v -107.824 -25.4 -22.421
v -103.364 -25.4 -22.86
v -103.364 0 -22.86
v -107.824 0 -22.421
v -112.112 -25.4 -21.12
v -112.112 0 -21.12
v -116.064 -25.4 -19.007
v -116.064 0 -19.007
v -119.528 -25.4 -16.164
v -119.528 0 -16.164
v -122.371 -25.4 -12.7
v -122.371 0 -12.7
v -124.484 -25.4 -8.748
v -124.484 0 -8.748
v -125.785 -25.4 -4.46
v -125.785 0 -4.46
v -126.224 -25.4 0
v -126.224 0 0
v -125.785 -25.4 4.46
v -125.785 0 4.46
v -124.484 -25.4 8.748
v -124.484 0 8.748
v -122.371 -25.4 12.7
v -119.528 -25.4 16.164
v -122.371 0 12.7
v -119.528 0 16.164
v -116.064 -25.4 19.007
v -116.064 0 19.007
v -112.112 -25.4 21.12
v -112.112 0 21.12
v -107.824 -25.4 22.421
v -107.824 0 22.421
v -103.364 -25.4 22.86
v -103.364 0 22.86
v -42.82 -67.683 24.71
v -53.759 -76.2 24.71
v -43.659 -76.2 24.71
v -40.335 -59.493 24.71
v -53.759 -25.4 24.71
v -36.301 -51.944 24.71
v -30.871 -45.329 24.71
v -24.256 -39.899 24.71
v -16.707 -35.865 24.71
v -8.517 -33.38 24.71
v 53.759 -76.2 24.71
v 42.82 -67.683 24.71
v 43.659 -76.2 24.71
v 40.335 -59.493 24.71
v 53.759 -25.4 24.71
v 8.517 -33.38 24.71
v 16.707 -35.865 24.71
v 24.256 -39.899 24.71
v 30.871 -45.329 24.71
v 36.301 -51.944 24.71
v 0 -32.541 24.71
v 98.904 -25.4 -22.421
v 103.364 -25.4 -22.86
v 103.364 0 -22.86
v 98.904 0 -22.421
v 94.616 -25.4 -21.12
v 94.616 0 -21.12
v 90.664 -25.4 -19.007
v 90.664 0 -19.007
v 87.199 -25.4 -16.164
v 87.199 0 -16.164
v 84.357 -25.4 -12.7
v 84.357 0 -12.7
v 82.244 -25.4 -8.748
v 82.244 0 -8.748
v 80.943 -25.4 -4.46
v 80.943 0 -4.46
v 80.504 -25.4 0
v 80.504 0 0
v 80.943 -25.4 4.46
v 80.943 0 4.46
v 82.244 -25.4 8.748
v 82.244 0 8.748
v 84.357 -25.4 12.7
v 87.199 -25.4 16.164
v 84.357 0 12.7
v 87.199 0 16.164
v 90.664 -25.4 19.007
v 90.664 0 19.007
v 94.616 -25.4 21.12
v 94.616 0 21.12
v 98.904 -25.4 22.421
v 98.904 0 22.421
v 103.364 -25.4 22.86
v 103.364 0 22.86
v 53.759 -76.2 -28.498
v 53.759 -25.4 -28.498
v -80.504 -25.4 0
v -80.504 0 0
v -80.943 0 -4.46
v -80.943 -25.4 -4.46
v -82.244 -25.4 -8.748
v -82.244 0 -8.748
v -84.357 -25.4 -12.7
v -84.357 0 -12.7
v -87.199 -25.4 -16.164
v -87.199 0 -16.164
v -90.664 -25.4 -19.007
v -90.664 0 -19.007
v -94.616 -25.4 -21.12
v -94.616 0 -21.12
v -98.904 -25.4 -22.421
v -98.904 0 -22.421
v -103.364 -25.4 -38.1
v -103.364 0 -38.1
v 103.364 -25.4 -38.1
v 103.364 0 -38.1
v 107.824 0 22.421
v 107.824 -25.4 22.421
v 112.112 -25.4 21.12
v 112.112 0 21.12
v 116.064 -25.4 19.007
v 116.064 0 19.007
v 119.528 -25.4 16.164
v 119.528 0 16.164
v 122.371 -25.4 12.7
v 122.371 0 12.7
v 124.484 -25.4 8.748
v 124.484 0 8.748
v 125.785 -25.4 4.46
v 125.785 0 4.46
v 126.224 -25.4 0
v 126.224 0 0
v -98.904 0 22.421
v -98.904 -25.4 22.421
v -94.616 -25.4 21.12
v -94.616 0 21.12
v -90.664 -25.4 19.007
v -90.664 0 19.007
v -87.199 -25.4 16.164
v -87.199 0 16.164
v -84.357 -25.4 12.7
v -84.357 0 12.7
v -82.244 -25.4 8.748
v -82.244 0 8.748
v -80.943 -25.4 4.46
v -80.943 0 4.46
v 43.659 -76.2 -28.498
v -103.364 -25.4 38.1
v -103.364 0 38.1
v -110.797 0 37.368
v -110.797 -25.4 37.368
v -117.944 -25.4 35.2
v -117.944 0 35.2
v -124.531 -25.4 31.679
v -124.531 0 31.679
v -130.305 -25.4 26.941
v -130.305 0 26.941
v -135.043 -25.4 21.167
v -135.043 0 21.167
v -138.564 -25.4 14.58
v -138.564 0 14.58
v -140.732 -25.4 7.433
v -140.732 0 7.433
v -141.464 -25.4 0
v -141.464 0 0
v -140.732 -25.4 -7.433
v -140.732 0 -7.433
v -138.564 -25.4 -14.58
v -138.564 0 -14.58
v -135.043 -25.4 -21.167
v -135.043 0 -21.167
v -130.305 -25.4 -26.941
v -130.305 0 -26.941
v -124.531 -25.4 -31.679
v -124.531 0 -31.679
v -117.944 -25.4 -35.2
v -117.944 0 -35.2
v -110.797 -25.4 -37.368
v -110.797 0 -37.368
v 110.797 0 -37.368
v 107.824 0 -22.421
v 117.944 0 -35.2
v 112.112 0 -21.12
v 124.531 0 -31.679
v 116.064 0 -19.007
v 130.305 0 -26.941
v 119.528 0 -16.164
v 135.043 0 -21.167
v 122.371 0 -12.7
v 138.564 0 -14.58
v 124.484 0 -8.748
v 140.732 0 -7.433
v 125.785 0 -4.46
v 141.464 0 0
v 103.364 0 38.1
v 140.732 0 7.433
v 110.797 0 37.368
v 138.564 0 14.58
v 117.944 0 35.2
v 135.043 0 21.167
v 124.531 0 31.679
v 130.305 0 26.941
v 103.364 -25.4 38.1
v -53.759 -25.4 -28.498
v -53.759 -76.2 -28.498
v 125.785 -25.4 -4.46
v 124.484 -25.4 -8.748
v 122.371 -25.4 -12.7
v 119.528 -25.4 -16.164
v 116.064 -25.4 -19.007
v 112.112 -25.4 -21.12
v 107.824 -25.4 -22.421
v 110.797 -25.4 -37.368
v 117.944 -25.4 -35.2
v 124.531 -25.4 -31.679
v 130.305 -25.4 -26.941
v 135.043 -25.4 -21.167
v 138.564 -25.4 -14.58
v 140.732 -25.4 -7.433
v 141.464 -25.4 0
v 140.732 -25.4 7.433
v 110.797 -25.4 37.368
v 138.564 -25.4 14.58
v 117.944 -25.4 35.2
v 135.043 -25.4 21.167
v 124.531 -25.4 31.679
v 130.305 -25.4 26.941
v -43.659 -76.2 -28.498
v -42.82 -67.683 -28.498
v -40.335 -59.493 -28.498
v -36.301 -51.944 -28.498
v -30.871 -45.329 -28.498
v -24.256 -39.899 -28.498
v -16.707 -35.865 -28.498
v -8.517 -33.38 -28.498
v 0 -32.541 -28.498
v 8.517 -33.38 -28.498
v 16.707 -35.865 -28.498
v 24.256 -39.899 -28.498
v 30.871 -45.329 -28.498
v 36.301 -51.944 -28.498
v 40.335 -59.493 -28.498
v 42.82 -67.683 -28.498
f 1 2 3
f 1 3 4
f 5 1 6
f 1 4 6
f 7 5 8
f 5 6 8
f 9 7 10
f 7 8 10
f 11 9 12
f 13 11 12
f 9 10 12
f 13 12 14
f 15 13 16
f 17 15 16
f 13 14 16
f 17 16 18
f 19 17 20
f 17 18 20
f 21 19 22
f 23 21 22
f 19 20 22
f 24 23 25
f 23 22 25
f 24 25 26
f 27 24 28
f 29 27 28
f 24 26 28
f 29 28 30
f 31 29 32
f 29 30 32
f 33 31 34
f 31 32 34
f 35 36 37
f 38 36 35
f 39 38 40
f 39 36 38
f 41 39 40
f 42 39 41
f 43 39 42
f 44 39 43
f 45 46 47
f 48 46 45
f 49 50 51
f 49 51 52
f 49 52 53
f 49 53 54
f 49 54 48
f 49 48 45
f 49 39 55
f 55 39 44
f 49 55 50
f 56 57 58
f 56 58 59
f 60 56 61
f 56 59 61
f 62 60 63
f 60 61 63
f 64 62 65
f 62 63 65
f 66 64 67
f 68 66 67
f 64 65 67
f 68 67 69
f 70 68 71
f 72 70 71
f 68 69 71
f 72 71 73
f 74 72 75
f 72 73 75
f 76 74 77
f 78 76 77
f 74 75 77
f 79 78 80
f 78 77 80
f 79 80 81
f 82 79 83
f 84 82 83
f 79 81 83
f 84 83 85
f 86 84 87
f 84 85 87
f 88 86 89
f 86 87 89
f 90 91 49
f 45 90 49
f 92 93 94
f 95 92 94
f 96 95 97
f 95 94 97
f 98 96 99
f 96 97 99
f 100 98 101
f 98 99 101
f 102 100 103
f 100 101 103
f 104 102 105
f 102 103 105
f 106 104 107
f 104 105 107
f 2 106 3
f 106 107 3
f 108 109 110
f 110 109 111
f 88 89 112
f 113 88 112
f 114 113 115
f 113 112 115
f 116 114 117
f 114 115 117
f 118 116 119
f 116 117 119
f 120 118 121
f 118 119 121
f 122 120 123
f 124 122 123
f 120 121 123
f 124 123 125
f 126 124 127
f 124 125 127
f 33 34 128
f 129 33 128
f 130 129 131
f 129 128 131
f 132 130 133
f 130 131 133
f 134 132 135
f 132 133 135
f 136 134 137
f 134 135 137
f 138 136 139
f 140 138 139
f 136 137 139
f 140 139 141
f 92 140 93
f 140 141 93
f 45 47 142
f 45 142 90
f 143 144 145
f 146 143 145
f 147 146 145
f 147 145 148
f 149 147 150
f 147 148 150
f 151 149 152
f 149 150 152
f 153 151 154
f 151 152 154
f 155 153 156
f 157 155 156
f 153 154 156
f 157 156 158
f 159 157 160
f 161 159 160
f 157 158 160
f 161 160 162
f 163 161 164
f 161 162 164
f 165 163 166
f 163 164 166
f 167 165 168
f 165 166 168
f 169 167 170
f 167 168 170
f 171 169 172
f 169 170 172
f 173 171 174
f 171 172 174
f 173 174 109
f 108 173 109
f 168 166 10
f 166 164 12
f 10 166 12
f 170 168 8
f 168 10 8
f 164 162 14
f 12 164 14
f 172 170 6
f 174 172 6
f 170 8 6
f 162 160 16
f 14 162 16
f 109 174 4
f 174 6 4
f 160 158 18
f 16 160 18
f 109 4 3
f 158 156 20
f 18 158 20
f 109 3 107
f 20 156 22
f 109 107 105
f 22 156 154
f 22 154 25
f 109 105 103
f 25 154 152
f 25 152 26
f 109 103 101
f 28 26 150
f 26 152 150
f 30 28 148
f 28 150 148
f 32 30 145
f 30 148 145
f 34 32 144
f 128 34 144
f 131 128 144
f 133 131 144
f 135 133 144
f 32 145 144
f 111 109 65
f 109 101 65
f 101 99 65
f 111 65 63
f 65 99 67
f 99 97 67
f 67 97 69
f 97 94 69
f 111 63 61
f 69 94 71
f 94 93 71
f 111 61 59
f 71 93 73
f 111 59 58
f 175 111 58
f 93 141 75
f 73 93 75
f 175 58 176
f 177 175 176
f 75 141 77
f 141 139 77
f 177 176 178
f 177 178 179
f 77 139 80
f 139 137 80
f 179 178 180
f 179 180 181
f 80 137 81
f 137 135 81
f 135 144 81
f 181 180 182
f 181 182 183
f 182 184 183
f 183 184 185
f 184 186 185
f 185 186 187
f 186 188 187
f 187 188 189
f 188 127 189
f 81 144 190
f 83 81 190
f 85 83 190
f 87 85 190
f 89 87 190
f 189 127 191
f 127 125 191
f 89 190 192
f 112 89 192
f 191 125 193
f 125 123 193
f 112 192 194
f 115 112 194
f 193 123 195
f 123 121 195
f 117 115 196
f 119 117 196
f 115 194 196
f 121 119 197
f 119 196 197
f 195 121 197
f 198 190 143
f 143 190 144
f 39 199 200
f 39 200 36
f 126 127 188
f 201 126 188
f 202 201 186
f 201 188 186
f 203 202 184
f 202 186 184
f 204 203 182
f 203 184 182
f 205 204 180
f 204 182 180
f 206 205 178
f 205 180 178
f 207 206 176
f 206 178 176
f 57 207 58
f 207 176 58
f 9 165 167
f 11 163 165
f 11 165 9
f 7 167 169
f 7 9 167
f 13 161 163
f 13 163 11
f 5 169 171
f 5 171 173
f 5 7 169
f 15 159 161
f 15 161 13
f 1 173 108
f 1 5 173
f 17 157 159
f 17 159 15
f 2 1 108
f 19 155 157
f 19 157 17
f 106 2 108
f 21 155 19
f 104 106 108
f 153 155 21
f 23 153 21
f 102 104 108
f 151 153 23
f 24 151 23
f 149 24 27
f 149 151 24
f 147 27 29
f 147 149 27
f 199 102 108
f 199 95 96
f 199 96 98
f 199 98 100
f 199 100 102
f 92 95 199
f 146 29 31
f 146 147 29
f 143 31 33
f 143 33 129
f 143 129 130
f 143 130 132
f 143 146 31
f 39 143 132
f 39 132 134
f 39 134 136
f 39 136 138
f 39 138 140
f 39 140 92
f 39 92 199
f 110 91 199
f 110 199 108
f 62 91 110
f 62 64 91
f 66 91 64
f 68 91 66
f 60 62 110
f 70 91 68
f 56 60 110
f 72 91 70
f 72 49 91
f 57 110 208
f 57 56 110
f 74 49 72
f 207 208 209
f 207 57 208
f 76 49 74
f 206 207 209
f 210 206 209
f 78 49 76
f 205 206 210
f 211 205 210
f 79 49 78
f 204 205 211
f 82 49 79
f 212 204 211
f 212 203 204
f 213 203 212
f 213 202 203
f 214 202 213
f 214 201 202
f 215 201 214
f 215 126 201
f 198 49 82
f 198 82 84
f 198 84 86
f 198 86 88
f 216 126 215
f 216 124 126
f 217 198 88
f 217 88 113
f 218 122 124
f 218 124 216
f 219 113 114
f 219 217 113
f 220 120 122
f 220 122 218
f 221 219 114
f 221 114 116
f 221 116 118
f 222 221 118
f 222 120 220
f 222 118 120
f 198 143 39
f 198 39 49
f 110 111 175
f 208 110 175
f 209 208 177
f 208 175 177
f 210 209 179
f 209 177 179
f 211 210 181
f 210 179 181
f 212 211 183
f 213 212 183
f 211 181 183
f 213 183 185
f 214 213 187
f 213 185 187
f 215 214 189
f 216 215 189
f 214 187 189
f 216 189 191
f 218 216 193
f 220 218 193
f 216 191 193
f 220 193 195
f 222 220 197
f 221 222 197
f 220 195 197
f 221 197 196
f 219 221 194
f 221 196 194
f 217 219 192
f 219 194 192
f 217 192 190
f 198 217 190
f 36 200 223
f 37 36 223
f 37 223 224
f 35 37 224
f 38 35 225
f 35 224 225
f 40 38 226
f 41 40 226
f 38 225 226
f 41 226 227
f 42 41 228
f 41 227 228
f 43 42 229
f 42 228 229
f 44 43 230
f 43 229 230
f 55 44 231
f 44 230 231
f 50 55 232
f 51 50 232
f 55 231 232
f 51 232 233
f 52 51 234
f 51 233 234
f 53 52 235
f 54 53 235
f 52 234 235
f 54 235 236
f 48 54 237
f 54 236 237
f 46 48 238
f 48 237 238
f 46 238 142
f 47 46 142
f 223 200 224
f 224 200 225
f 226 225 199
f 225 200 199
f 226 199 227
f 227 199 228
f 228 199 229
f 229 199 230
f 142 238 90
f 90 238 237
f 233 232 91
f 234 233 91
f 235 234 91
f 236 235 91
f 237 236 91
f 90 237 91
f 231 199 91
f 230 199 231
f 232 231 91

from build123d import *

# Parameters (mm, degrees)
F1_DEPTH = 25.4
F2_W     = 107.5181365013
F2_H     = 53.2084149309
F3_DEPTH = 50.8
F4_R     = 43.6587817112
F5_DEPTH = 203.2


with BuildPart() as f1:
    # F0 (on Front) → F1 (new body)
    with BuildSketch(Plane.XZ):
        with BuildLine():
            Line((-103.3638969086, 22.86), (-103.3638969086, 38.1))
            ThreePointArc((-103.3638969086, 38.1), (-141.4638969086, 0), (-103.3638969086, -38.1))
            Line((-103.3638969086, -38.1), (-103.3638969086, -22.86))
            ThreePointArc((-103.3638969086, -22.86), (-126.2238969086, 0), (-103.3638969086, 22.86))
        make_face()
        with BuildLine():
            ThreePointArc((141.4638969086, 0), (130.3046652718, 26.9407683632), (103.3638969086, 38.1))
            Line((103.3638969086, 38.1), (103.3638969086, 22.86))
            ThreePointArc((103.3638969086, 22.86), (119.5283579265, 16.1644610179), (126.2238969086, 0))
            ThreePointArc((126.2238969086, 0), (119.5283579265, -16.1644610179), (103.3638969086, -22.86))
            Line((103.3638969086, -22.86), (103.3638969086, -38.1))
            ThreePointArc((103.3638969086, -38.1), (130.3046652718, -26.9407683632), (141.4638969086, 0))
        make_face()
        with BuildLine():
            ThreePointArc((-65.2638969086, 0), (-76.4231285454, 26.9407683632), (-103.3638969086, 38.1))
            Line((-103.3638969086, 38.1), (-103.3638969086, 22.86))
            ThreePointArc((-103.3638969086, 22.86), (-87.1994358907, 16.1644610179), (-80.5038969086, 0))
            ThreePointArc((-80.5038969086, 0), (-87.1994358907, -16.1644610179), (-103.3638969086, -22.86))
            Line((-103.3638969086, -22.86), (-103.3638969086, -38.1))
            ThreePointArc((-103.3638969086, -38.1), (-76.4231285454, -26.9407683632), (-65.2638969086, 0))
        make_face()
        with BuildLine():
            Line((103.3638969086, 22.86), (103.3638969086, 38.1))
            ThreePointArc((103.3638969086, 38.1), (65.2638969086, 0), (103.3638969086, -38.1))
            Line((103.3638969086, -38.1), (103.3638969086, -22.86))
            ThreePointArc((103.3638969086, -22.86), (80.5038969086, 0), (103.3638969086, 22.86))
        make_face()
        with BuildLine():
            Line((103.3638969086, 38.1), (-103.3638969086, 38.1))
            ThreePointArc((-103.3638969086, 38.1), (-76.4231285454, 26.9407683632), (-65.2638969086, 0))
            ThreePointArc((-65.2638969086, 0), (-76.4231285454, -26.9407683632), (-103.3638969086, -38.1))
            Line((-103.3638969086, -38.1), (103.3638969086, -38.1))
            ThreePointArc((103.3638969086, -38.1), (65.2638969086, 0), (103.3638969086, 38.1))
        make_face()
    extrude(amount=F1_DEPTH)

    # F2 (on face) → F3 (join)
    with BuildSketch(Plane.XZ.offset(25.4)):
        with Locations((0, -1.8939918373)):
            Rectangle(F2_W, F2_H)
    extrude(amount=F3_DEPTH)

    # F4 (on face) → F5 (cut)
    with BuildSketch(Plane(origin=(0, 0, -28.4981993027), x_dir=(1, 0, 0), z_dir=(0, 0, -1))):
        with Locations((0, 76.2)):
            Circle(F4_R)
    extrude(amount=-F5_DEPTH, mode=Mode.SUBTRACT)


solid = f1.part
